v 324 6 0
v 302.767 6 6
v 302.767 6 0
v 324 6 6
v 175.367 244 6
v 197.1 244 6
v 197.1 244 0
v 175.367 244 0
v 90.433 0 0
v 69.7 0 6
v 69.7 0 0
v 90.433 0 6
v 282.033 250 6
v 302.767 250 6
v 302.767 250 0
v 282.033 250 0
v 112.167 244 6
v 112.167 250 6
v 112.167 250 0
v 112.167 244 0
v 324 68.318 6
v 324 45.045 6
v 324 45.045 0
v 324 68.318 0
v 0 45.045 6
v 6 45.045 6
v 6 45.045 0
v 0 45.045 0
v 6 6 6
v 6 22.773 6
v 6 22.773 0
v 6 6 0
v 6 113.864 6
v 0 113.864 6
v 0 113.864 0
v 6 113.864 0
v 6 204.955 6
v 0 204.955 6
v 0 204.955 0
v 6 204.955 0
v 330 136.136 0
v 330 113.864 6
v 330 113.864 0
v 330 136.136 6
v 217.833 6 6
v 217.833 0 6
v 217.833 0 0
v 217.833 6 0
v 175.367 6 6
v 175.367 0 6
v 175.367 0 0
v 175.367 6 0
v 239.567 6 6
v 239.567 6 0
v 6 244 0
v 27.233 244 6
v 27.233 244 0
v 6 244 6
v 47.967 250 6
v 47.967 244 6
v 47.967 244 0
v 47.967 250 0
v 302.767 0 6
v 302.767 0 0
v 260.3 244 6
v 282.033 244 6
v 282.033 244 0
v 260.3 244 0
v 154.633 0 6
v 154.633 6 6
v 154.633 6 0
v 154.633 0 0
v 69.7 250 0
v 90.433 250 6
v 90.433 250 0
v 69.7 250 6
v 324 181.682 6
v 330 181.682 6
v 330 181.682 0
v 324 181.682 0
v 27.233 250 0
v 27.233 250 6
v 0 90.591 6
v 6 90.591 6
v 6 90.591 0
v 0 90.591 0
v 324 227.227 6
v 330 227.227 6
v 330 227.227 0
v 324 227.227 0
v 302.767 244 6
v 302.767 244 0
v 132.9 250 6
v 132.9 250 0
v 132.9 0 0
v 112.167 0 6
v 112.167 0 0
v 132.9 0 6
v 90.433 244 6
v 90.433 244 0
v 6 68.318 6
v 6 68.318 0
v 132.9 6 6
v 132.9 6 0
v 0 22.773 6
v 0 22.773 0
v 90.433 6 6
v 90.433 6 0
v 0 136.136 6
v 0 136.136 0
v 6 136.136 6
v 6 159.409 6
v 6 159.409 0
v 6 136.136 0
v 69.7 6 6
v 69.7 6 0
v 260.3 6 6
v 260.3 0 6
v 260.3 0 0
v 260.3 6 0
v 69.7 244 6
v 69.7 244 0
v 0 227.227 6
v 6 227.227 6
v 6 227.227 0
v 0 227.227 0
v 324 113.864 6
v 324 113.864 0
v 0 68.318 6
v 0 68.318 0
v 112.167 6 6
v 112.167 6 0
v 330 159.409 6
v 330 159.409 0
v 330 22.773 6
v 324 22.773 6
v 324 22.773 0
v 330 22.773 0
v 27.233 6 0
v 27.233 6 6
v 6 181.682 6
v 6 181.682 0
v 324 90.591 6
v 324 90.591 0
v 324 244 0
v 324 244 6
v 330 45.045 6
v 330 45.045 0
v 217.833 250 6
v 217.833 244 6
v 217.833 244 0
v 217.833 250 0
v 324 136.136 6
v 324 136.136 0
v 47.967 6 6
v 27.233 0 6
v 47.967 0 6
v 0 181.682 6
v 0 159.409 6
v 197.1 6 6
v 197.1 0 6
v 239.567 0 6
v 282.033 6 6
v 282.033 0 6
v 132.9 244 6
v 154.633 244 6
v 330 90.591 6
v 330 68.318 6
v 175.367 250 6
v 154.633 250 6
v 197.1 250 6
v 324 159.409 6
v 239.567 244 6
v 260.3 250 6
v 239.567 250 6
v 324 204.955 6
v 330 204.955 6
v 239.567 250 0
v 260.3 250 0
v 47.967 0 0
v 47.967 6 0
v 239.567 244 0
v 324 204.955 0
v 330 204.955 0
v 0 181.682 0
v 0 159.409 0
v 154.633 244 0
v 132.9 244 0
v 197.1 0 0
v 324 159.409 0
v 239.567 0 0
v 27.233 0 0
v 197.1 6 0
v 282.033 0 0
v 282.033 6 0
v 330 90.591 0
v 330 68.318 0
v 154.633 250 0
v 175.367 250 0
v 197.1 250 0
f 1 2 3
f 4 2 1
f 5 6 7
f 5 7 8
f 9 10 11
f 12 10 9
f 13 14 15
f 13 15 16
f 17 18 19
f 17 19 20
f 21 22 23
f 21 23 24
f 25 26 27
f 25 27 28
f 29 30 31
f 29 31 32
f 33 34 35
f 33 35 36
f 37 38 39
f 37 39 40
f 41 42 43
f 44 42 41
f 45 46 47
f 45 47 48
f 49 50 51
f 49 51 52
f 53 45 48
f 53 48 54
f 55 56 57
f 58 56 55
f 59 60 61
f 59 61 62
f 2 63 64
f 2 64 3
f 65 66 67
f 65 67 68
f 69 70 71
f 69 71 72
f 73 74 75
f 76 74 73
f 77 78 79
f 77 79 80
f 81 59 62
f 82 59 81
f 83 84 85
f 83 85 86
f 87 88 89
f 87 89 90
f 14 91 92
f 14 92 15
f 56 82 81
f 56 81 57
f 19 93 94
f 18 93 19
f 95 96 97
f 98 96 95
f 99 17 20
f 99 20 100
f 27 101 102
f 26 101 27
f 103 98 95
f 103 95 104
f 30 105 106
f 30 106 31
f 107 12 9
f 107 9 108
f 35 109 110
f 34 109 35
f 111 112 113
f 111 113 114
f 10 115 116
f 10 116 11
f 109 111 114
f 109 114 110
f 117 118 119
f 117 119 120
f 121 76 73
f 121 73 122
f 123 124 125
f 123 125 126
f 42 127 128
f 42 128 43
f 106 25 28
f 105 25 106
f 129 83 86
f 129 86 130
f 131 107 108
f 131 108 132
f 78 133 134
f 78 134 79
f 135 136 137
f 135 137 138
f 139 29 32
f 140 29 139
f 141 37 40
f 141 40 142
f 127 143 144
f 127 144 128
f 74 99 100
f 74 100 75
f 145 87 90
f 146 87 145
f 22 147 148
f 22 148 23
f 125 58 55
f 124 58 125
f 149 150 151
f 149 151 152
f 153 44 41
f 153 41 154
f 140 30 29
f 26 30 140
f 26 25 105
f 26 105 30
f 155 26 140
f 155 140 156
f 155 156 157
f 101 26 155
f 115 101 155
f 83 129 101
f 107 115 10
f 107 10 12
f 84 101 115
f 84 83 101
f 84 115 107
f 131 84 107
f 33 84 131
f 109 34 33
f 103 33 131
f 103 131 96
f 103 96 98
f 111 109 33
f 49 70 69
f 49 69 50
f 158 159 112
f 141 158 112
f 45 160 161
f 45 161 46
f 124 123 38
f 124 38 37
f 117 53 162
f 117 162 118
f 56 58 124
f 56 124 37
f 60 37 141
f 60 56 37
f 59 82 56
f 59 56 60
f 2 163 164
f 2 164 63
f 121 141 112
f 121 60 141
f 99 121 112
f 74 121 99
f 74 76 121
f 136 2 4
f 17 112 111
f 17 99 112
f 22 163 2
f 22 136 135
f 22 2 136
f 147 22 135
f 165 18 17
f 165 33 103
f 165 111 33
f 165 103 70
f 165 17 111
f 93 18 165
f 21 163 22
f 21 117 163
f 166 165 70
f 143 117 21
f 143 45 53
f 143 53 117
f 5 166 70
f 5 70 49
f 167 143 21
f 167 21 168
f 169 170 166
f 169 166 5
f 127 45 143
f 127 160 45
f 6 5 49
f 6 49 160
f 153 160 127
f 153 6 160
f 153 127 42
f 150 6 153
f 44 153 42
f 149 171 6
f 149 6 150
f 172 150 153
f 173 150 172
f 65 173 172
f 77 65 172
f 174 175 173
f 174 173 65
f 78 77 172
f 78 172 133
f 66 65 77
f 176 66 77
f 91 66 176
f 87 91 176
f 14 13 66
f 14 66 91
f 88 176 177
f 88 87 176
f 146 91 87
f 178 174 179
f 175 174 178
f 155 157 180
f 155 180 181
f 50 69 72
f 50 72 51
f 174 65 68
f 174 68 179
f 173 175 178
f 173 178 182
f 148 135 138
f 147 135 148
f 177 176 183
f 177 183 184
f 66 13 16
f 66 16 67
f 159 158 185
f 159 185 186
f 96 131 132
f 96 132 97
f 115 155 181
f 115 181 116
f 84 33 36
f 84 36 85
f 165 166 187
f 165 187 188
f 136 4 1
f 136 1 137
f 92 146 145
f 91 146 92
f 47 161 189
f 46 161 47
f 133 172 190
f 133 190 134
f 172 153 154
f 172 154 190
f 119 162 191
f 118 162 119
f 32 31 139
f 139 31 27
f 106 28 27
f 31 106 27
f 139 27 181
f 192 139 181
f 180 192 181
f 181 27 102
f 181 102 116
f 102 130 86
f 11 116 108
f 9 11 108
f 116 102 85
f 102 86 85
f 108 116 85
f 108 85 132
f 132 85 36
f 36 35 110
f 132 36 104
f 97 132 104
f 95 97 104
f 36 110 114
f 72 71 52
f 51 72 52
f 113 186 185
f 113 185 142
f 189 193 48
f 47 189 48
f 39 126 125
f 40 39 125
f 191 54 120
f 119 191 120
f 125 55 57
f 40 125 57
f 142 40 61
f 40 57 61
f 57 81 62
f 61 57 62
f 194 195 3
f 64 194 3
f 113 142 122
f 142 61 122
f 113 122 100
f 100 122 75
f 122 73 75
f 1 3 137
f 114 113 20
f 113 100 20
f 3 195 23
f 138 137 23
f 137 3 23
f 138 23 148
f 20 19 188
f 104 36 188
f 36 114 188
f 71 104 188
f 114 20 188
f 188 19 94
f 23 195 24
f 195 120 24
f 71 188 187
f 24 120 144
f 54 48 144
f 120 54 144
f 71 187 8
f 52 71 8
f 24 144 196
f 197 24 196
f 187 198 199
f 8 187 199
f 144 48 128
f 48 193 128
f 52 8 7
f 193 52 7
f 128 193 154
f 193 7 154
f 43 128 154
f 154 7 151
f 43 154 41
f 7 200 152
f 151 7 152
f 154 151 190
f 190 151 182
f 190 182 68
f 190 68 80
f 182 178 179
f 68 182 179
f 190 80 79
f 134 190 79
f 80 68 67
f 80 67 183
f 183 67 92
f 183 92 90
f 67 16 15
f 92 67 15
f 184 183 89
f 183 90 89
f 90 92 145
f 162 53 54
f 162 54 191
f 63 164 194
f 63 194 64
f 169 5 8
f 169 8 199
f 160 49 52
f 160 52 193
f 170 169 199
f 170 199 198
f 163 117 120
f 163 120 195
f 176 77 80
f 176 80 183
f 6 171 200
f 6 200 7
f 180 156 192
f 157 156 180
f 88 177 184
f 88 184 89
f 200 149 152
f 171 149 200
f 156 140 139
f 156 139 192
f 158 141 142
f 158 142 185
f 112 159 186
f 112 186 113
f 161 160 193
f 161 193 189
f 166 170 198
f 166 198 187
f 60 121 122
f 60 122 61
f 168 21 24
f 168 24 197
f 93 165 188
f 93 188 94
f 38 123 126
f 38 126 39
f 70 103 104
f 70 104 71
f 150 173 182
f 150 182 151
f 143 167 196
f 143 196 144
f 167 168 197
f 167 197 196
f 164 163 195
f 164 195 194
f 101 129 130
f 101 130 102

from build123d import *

# Parameters (mm, degrees)
BOSS_EXTRUDE1_DEPTH = 6


with BuildPart() as part:
    # Sketch1 → Boss-Extrude1 (new body)
    with BuildSketch(Plane.XY.offset(6)):
        Polygon((302.766666667, 244), (302.766666667, 250), (282.033333333, 250), (282.033333333, 244), (260.3, 244), (260.3, 250), (239.566666667, 250), (239.566666667, 244), (217.833333333, 244), (217.833333333, 250), (197.1, 250), (197.1, 244), (175.366666667, 244), (175.366666667, 250), (154.633333333, 250), (154.633333333, 244), (132.9, 244), (132.9, 250), (112.166666667, 250), (112.166666667, 244), (90.433333333, 244), (90.433333333, 250), (69.7, 250), (69.7, 244), (47.966666667, 244), (47.966666667, 250), (27.233333333, 250), (27.233333333, 244), (6, 244), (6, 227.227272727), (0, 227.227272727), (0, 204.954545455), (6, 204.954545455), (6, 181.681818182), (0, 181.681818182), (0, 159.409090909), (6, 159.409090909), (6, 136.136363636), (0, 136.136363636), (0, 113.863636364), (6, 113.863636364), (6, 90.590909091), (0, 90.590909091), (0, 68.318181818), (6, 68.318181818), (6, 45.045454545), (0, 45.045454545), (0, 22.772727273), (6, 22.772727273), (6, 6), (27.233333333, 6), (27.233333333, 0), (47.966666667, 0), (47.966666667, 6), (69.7, 6), (69.7, 0), (90.433333333, 0), (90.433333333, 6), (112.166666667, 6), (112.166666667, 0), (132.9, 0), (132.9, 6), (154.633333333, 6), (154.633333333, 0), (175.366666667, 0), (175.366666667, 6), (197.1, 6), (197.1, 0), (217.833333333, 0), (217.833333333, 6), (239.566666667, 6), (239.566666667, 0), (260.3, 0), (260.3, 6), (282.033333333, 6), (282.033333333, 0), (302.766666667, 0), (302.766666667, 6), (324, 6), (324, 22.772727273), (330, 22.772727273), (330, 45.045454545), (324, 45.045454545), (324, 68.318181818), (330, 68.318181818), (330, 90.590909091), (324, 90.590909091), (324, 113.863636364), (330, 113.863636364), (330, 136.136363636), (324, 136.136363636), (324, 159.409090909), (330, 159.409090909), (330, 181.681818182), (324, 181.681818182), (324, 204.954545455), (330, 204.954545455), (330, 227.227272727), (324, 227.227272727), (324, 244), align=None)
    extrude(amount=-BOSS_EXTRUDE1_DEPTH)


solid = part.part
